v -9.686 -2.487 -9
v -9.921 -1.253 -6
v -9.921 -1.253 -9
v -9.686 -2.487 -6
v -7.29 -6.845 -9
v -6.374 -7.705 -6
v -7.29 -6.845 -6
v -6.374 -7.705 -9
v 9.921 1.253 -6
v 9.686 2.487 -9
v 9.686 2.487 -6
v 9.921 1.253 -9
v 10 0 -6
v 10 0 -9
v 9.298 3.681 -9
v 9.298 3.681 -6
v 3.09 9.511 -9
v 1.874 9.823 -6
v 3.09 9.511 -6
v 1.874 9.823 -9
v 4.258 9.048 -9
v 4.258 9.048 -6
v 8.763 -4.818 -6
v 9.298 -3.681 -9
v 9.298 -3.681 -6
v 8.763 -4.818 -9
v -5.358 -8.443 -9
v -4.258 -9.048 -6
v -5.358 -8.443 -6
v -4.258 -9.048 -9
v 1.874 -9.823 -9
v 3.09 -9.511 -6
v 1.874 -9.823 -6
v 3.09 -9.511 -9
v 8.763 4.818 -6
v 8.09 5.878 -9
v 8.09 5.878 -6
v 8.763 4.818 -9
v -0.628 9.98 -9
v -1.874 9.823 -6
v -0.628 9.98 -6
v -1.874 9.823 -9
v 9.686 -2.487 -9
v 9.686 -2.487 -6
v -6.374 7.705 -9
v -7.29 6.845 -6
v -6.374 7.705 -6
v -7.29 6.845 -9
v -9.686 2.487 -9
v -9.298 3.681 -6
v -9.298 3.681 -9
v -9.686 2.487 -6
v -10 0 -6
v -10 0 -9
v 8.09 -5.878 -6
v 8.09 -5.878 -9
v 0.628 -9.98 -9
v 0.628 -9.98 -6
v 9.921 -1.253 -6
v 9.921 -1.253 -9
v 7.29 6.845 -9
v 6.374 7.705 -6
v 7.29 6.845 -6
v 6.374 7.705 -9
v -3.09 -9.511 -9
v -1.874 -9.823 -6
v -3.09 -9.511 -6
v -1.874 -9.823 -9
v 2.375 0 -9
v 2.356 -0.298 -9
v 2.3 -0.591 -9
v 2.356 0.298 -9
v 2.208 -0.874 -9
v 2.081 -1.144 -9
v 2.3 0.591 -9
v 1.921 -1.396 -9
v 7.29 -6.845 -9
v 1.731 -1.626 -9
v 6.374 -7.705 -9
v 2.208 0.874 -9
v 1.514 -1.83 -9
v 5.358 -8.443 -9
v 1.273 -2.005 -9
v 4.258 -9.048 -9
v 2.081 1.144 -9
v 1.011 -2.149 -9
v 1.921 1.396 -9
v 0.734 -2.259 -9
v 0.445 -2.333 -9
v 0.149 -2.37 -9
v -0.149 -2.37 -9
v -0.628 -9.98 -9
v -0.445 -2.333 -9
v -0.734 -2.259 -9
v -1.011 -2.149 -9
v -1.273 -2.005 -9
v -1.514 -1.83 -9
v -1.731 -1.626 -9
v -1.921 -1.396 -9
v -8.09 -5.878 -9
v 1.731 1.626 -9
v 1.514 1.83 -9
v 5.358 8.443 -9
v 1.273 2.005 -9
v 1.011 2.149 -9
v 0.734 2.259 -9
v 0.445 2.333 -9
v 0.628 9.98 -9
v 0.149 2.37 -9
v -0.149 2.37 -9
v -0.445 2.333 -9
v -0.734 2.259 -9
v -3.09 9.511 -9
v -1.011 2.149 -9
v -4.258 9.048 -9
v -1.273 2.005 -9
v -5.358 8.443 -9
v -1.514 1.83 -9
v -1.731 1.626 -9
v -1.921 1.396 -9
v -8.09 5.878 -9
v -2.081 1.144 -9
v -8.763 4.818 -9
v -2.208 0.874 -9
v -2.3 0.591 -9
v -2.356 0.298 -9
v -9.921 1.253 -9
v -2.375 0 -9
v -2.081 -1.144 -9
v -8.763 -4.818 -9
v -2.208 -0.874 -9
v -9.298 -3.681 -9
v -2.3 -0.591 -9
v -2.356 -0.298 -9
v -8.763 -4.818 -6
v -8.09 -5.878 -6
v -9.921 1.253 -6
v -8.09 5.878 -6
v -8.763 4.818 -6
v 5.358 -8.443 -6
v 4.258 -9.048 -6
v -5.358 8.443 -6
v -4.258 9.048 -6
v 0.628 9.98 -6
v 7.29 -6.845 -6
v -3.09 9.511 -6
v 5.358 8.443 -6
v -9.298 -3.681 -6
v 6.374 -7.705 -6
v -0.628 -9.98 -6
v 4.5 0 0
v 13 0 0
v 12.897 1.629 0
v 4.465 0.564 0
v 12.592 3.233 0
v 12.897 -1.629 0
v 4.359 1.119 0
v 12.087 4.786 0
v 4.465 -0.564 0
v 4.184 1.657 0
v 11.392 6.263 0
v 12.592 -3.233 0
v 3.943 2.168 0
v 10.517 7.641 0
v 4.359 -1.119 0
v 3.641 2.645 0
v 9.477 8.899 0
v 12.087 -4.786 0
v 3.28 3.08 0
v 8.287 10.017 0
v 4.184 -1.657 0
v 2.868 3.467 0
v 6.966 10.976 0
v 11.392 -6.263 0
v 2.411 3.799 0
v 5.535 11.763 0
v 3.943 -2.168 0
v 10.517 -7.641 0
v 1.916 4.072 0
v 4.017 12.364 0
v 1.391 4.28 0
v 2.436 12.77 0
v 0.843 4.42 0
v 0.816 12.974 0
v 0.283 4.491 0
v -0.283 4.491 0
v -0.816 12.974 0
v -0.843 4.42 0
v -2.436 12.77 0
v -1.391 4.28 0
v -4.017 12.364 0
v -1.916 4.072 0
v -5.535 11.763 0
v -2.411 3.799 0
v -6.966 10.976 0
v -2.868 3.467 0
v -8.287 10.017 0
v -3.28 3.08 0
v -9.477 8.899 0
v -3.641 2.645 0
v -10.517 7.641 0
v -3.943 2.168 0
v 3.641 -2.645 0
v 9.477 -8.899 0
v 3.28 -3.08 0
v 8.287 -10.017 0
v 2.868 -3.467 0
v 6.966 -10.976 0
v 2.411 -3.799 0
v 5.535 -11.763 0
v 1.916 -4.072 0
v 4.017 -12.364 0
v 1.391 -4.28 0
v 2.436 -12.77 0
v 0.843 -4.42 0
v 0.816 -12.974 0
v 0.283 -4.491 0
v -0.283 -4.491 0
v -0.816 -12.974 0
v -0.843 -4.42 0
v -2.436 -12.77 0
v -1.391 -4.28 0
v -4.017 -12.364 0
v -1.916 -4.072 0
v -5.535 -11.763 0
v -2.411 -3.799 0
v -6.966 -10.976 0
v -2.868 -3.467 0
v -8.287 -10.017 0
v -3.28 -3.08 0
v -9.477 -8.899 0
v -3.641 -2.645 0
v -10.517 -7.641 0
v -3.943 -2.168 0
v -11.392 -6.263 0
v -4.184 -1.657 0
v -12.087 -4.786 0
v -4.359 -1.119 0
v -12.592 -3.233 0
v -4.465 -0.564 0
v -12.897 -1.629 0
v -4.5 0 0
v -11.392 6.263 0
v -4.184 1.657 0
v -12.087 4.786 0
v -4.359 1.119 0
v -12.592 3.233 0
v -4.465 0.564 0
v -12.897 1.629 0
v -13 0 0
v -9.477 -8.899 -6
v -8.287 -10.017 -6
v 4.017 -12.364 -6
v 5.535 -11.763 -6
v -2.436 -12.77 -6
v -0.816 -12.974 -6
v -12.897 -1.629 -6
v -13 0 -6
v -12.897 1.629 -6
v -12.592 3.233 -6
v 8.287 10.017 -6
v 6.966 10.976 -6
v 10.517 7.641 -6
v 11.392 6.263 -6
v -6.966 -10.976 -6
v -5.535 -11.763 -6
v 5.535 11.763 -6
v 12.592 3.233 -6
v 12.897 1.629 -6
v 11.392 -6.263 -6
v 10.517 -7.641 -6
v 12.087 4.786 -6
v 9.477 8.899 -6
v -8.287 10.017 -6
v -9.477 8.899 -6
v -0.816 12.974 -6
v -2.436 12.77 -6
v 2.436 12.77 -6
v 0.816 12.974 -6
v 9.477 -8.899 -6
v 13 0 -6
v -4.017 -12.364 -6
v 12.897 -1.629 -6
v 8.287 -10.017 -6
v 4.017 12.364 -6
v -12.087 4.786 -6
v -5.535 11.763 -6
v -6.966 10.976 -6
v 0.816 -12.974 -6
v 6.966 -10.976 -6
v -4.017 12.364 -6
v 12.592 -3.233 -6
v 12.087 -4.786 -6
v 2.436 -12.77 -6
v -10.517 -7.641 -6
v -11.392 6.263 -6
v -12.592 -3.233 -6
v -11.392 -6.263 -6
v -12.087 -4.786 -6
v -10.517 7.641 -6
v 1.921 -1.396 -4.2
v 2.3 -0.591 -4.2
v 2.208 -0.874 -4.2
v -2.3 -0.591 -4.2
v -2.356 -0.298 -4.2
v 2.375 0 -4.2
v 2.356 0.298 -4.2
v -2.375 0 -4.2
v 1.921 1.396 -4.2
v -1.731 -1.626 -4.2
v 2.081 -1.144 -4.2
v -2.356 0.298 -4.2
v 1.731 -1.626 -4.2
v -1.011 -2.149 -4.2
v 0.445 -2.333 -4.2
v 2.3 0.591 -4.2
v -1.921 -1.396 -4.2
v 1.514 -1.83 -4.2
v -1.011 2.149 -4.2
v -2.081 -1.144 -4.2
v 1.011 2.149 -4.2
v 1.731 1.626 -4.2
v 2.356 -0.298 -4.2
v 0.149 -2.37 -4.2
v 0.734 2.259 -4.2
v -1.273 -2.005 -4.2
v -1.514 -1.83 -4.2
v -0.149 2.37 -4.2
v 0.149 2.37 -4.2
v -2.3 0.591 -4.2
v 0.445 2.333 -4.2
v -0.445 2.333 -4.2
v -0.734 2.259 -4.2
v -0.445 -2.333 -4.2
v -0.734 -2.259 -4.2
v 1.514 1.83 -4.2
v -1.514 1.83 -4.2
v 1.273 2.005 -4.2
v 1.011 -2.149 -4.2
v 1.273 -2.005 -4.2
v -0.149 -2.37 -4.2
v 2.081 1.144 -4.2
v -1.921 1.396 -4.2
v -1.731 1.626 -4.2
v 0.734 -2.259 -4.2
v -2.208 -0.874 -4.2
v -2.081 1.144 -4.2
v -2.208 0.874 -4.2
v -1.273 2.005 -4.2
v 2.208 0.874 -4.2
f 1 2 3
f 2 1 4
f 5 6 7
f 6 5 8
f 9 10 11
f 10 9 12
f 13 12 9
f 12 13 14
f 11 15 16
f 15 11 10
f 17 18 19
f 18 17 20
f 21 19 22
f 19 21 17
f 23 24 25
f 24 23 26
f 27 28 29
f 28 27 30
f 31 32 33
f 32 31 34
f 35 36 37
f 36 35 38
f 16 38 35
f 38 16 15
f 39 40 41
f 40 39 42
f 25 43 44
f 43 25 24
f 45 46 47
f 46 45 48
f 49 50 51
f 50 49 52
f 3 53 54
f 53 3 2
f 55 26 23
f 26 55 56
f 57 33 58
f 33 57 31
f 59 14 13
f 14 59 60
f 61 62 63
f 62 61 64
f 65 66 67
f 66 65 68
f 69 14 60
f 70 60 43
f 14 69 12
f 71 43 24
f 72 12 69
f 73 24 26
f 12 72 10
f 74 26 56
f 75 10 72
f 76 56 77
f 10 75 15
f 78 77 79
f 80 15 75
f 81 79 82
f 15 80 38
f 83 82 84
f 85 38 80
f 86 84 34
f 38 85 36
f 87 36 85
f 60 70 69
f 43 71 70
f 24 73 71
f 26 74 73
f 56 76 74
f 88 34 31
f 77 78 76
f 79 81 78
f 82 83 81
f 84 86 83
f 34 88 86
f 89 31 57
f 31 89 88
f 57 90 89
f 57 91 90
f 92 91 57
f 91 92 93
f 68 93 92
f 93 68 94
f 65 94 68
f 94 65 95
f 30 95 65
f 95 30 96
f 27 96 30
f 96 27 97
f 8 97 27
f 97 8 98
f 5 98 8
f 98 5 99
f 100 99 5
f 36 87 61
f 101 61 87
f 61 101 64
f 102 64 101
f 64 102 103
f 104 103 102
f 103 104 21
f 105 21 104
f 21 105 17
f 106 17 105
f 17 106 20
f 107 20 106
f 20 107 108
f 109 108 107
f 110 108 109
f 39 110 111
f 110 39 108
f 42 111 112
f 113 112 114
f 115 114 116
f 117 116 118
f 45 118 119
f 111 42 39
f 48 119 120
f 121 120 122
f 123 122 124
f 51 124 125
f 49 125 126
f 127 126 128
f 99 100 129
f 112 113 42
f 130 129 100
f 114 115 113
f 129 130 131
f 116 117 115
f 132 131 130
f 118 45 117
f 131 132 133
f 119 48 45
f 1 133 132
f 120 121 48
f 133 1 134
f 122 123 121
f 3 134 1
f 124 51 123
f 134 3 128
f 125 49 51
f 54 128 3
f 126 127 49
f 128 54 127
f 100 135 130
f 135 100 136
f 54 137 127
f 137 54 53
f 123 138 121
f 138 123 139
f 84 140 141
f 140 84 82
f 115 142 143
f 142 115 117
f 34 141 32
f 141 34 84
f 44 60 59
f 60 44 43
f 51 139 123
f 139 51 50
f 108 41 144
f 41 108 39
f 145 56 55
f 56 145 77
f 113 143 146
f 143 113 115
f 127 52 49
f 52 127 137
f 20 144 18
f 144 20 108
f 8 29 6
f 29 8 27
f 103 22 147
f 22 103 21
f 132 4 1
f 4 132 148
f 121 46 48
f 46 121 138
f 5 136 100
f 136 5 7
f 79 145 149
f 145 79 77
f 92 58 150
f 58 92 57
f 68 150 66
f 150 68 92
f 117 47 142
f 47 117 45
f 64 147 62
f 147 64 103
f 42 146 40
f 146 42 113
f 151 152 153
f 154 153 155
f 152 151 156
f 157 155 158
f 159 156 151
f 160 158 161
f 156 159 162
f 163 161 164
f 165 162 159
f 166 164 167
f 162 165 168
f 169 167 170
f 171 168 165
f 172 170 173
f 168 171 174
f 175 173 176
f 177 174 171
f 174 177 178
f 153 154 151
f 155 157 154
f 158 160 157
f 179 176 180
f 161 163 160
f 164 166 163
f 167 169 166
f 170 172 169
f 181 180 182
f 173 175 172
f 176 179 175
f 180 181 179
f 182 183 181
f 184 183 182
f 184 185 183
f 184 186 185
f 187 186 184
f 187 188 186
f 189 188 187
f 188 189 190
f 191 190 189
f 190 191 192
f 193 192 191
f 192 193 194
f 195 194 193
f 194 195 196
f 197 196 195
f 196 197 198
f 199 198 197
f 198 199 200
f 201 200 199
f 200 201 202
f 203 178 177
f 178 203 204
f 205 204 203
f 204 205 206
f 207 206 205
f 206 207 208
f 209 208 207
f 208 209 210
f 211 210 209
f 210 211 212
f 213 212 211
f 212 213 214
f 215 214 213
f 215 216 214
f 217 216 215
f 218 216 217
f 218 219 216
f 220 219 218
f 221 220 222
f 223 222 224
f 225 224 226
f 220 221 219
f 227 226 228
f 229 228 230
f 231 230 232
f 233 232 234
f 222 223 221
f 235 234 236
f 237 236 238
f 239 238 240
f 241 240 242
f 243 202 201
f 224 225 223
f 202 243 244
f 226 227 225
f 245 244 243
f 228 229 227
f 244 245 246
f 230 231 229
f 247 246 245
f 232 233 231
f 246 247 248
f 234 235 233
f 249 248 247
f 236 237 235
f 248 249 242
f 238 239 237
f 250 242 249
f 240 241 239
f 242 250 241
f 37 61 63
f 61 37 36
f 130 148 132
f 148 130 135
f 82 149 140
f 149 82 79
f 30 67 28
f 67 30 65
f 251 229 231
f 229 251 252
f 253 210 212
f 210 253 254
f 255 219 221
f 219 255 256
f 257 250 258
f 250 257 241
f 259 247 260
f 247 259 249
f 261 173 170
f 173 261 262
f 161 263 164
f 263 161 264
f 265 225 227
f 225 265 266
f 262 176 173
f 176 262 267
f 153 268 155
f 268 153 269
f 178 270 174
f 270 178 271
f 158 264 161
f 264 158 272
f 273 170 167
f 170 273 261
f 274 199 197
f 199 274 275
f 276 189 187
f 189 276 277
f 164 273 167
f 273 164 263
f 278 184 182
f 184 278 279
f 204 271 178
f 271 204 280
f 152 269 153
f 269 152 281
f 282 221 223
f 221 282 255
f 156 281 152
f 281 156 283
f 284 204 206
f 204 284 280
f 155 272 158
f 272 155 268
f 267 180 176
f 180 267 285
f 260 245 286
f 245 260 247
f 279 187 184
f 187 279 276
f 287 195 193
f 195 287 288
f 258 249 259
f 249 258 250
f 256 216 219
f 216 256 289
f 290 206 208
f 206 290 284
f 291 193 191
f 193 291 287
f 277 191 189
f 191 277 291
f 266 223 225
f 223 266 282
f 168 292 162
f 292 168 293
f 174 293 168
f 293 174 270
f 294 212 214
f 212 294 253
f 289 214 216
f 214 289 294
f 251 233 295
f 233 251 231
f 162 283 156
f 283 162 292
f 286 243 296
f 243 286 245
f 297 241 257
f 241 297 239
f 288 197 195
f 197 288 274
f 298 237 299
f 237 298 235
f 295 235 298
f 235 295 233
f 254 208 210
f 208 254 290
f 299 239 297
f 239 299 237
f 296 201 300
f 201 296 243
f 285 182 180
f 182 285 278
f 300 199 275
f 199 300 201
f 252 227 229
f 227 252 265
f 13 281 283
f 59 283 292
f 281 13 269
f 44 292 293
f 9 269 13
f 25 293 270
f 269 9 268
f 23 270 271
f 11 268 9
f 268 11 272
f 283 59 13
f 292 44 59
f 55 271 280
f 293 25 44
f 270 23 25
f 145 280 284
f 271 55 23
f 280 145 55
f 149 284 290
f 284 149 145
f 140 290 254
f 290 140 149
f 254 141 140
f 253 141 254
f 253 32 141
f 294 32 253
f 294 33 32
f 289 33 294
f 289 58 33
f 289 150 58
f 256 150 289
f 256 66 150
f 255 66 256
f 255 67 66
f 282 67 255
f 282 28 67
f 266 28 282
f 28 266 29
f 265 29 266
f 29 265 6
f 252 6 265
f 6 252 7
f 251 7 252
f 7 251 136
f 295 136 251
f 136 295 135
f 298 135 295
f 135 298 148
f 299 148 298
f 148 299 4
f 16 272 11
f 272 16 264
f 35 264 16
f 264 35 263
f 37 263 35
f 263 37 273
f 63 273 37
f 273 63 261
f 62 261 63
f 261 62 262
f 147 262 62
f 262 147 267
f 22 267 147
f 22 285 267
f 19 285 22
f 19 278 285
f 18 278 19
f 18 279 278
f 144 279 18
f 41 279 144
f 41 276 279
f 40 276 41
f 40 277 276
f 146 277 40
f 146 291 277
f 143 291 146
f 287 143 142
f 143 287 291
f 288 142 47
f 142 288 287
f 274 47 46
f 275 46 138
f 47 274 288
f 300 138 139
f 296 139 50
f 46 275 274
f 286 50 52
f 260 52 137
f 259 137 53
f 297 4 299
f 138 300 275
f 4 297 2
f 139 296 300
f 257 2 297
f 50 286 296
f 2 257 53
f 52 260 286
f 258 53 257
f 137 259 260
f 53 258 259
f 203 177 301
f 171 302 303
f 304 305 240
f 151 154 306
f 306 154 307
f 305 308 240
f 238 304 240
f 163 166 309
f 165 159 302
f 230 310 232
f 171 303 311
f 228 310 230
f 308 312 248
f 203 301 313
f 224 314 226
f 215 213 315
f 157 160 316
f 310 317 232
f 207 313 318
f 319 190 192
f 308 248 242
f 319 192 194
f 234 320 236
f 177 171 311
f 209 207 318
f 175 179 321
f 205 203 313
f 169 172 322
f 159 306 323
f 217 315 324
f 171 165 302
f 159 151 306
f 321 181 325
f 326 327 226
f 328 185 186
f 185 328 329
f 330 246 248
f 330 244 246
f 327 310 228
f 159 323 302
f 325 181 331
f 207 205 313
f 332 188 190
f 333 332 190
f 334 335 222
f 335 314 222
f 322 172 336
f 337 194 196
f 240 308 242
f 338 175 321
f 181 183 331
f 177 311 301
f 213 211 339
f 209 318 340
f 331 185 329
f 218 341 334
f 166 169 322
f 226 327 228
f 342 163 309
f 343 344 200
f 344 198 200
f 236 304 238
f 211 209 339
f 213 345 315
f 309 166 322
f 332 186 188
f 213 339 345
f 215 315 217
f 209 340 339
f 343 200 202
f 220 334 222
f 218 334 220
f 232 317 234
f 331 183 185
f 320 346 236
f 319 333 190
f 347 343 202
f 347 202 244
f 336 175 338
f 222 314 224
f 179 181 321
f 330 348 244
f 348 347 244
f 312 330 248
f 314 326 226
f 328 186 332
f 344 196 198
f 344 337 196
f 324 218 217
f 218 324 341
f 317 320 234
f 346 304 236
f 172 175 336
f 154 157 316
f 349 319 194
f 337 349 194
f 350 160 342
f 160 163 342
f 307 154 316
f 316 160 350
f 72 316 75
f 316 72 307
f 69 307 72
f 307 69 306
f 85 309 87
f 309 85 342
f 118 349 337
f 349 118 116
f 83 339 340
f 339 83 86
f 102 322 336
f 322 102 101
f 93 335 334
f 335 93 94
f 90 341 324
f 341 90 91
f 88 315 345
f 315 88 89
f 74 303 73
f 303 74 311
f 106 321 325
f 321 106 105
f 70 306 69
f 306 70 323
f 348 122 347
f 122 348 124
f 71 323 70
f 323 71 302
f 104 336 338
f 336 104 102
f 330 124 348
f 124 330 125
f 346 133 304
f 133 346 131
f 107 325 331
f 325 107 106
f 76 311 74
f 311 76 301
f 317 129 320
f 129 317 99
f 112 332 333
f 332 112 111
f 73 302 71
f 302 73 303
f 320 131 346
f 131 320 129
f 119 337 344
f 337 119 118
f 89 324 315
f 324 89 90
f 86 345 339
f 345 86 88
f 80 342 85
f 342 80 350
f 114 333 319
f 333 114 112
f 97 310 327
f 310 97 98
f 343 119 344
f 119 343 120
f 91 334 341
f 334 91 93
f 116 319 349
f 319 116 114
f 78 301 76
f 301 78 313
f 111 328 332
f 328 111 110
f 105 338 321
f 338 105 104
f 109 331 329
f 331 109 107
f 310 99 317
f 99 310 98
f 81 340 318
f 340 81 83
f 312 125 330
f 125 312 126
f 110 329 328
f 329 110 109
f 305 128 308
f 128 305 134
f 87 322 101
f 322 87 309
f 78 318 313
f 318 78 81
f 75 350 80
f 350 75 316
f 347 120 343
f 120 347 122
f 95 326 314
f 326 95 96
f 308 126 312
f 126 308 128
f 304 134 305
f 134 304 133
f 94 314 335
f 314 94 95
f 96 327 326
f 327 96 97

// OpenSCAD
$fn = 50;


difference() {
	union() {
		translate(v = [0, 0, -9.0000000000]) {
			cylinder(h = 9, r = 10.0000000000);
		}
		translate(v = [0, 0, -6.0000000000]) {
			cylinder(h = 6, r = 13.0000000000);
		}
	}
	union() {
		translate(v = [0, 0, 0]) {
			rotate(a = [0, 0, 0]) {
				difference() {
					union() {
						#translate(v = [0, 0, -9.0000000000]) {
							cylinder(h = 9, r = 2.2500000000);
						}
						#translate(v = [0, 0, -4.2000000000]) {
							cylinder(h = 4.2000000000, r1 = 2.3750000000, r2 = 4.5000000000);
						}
						#translate(v = [0, 0, -9.0000000000]) {
							cylinder(h = 9, r = 2.3750000000);
						}
						#translate(v = [0, 0, -9.0000000000]) {
							cylinder(h = 9, r = 2.2500000000);
						}
					}
					union();
				}
			}
		}
	}
}
